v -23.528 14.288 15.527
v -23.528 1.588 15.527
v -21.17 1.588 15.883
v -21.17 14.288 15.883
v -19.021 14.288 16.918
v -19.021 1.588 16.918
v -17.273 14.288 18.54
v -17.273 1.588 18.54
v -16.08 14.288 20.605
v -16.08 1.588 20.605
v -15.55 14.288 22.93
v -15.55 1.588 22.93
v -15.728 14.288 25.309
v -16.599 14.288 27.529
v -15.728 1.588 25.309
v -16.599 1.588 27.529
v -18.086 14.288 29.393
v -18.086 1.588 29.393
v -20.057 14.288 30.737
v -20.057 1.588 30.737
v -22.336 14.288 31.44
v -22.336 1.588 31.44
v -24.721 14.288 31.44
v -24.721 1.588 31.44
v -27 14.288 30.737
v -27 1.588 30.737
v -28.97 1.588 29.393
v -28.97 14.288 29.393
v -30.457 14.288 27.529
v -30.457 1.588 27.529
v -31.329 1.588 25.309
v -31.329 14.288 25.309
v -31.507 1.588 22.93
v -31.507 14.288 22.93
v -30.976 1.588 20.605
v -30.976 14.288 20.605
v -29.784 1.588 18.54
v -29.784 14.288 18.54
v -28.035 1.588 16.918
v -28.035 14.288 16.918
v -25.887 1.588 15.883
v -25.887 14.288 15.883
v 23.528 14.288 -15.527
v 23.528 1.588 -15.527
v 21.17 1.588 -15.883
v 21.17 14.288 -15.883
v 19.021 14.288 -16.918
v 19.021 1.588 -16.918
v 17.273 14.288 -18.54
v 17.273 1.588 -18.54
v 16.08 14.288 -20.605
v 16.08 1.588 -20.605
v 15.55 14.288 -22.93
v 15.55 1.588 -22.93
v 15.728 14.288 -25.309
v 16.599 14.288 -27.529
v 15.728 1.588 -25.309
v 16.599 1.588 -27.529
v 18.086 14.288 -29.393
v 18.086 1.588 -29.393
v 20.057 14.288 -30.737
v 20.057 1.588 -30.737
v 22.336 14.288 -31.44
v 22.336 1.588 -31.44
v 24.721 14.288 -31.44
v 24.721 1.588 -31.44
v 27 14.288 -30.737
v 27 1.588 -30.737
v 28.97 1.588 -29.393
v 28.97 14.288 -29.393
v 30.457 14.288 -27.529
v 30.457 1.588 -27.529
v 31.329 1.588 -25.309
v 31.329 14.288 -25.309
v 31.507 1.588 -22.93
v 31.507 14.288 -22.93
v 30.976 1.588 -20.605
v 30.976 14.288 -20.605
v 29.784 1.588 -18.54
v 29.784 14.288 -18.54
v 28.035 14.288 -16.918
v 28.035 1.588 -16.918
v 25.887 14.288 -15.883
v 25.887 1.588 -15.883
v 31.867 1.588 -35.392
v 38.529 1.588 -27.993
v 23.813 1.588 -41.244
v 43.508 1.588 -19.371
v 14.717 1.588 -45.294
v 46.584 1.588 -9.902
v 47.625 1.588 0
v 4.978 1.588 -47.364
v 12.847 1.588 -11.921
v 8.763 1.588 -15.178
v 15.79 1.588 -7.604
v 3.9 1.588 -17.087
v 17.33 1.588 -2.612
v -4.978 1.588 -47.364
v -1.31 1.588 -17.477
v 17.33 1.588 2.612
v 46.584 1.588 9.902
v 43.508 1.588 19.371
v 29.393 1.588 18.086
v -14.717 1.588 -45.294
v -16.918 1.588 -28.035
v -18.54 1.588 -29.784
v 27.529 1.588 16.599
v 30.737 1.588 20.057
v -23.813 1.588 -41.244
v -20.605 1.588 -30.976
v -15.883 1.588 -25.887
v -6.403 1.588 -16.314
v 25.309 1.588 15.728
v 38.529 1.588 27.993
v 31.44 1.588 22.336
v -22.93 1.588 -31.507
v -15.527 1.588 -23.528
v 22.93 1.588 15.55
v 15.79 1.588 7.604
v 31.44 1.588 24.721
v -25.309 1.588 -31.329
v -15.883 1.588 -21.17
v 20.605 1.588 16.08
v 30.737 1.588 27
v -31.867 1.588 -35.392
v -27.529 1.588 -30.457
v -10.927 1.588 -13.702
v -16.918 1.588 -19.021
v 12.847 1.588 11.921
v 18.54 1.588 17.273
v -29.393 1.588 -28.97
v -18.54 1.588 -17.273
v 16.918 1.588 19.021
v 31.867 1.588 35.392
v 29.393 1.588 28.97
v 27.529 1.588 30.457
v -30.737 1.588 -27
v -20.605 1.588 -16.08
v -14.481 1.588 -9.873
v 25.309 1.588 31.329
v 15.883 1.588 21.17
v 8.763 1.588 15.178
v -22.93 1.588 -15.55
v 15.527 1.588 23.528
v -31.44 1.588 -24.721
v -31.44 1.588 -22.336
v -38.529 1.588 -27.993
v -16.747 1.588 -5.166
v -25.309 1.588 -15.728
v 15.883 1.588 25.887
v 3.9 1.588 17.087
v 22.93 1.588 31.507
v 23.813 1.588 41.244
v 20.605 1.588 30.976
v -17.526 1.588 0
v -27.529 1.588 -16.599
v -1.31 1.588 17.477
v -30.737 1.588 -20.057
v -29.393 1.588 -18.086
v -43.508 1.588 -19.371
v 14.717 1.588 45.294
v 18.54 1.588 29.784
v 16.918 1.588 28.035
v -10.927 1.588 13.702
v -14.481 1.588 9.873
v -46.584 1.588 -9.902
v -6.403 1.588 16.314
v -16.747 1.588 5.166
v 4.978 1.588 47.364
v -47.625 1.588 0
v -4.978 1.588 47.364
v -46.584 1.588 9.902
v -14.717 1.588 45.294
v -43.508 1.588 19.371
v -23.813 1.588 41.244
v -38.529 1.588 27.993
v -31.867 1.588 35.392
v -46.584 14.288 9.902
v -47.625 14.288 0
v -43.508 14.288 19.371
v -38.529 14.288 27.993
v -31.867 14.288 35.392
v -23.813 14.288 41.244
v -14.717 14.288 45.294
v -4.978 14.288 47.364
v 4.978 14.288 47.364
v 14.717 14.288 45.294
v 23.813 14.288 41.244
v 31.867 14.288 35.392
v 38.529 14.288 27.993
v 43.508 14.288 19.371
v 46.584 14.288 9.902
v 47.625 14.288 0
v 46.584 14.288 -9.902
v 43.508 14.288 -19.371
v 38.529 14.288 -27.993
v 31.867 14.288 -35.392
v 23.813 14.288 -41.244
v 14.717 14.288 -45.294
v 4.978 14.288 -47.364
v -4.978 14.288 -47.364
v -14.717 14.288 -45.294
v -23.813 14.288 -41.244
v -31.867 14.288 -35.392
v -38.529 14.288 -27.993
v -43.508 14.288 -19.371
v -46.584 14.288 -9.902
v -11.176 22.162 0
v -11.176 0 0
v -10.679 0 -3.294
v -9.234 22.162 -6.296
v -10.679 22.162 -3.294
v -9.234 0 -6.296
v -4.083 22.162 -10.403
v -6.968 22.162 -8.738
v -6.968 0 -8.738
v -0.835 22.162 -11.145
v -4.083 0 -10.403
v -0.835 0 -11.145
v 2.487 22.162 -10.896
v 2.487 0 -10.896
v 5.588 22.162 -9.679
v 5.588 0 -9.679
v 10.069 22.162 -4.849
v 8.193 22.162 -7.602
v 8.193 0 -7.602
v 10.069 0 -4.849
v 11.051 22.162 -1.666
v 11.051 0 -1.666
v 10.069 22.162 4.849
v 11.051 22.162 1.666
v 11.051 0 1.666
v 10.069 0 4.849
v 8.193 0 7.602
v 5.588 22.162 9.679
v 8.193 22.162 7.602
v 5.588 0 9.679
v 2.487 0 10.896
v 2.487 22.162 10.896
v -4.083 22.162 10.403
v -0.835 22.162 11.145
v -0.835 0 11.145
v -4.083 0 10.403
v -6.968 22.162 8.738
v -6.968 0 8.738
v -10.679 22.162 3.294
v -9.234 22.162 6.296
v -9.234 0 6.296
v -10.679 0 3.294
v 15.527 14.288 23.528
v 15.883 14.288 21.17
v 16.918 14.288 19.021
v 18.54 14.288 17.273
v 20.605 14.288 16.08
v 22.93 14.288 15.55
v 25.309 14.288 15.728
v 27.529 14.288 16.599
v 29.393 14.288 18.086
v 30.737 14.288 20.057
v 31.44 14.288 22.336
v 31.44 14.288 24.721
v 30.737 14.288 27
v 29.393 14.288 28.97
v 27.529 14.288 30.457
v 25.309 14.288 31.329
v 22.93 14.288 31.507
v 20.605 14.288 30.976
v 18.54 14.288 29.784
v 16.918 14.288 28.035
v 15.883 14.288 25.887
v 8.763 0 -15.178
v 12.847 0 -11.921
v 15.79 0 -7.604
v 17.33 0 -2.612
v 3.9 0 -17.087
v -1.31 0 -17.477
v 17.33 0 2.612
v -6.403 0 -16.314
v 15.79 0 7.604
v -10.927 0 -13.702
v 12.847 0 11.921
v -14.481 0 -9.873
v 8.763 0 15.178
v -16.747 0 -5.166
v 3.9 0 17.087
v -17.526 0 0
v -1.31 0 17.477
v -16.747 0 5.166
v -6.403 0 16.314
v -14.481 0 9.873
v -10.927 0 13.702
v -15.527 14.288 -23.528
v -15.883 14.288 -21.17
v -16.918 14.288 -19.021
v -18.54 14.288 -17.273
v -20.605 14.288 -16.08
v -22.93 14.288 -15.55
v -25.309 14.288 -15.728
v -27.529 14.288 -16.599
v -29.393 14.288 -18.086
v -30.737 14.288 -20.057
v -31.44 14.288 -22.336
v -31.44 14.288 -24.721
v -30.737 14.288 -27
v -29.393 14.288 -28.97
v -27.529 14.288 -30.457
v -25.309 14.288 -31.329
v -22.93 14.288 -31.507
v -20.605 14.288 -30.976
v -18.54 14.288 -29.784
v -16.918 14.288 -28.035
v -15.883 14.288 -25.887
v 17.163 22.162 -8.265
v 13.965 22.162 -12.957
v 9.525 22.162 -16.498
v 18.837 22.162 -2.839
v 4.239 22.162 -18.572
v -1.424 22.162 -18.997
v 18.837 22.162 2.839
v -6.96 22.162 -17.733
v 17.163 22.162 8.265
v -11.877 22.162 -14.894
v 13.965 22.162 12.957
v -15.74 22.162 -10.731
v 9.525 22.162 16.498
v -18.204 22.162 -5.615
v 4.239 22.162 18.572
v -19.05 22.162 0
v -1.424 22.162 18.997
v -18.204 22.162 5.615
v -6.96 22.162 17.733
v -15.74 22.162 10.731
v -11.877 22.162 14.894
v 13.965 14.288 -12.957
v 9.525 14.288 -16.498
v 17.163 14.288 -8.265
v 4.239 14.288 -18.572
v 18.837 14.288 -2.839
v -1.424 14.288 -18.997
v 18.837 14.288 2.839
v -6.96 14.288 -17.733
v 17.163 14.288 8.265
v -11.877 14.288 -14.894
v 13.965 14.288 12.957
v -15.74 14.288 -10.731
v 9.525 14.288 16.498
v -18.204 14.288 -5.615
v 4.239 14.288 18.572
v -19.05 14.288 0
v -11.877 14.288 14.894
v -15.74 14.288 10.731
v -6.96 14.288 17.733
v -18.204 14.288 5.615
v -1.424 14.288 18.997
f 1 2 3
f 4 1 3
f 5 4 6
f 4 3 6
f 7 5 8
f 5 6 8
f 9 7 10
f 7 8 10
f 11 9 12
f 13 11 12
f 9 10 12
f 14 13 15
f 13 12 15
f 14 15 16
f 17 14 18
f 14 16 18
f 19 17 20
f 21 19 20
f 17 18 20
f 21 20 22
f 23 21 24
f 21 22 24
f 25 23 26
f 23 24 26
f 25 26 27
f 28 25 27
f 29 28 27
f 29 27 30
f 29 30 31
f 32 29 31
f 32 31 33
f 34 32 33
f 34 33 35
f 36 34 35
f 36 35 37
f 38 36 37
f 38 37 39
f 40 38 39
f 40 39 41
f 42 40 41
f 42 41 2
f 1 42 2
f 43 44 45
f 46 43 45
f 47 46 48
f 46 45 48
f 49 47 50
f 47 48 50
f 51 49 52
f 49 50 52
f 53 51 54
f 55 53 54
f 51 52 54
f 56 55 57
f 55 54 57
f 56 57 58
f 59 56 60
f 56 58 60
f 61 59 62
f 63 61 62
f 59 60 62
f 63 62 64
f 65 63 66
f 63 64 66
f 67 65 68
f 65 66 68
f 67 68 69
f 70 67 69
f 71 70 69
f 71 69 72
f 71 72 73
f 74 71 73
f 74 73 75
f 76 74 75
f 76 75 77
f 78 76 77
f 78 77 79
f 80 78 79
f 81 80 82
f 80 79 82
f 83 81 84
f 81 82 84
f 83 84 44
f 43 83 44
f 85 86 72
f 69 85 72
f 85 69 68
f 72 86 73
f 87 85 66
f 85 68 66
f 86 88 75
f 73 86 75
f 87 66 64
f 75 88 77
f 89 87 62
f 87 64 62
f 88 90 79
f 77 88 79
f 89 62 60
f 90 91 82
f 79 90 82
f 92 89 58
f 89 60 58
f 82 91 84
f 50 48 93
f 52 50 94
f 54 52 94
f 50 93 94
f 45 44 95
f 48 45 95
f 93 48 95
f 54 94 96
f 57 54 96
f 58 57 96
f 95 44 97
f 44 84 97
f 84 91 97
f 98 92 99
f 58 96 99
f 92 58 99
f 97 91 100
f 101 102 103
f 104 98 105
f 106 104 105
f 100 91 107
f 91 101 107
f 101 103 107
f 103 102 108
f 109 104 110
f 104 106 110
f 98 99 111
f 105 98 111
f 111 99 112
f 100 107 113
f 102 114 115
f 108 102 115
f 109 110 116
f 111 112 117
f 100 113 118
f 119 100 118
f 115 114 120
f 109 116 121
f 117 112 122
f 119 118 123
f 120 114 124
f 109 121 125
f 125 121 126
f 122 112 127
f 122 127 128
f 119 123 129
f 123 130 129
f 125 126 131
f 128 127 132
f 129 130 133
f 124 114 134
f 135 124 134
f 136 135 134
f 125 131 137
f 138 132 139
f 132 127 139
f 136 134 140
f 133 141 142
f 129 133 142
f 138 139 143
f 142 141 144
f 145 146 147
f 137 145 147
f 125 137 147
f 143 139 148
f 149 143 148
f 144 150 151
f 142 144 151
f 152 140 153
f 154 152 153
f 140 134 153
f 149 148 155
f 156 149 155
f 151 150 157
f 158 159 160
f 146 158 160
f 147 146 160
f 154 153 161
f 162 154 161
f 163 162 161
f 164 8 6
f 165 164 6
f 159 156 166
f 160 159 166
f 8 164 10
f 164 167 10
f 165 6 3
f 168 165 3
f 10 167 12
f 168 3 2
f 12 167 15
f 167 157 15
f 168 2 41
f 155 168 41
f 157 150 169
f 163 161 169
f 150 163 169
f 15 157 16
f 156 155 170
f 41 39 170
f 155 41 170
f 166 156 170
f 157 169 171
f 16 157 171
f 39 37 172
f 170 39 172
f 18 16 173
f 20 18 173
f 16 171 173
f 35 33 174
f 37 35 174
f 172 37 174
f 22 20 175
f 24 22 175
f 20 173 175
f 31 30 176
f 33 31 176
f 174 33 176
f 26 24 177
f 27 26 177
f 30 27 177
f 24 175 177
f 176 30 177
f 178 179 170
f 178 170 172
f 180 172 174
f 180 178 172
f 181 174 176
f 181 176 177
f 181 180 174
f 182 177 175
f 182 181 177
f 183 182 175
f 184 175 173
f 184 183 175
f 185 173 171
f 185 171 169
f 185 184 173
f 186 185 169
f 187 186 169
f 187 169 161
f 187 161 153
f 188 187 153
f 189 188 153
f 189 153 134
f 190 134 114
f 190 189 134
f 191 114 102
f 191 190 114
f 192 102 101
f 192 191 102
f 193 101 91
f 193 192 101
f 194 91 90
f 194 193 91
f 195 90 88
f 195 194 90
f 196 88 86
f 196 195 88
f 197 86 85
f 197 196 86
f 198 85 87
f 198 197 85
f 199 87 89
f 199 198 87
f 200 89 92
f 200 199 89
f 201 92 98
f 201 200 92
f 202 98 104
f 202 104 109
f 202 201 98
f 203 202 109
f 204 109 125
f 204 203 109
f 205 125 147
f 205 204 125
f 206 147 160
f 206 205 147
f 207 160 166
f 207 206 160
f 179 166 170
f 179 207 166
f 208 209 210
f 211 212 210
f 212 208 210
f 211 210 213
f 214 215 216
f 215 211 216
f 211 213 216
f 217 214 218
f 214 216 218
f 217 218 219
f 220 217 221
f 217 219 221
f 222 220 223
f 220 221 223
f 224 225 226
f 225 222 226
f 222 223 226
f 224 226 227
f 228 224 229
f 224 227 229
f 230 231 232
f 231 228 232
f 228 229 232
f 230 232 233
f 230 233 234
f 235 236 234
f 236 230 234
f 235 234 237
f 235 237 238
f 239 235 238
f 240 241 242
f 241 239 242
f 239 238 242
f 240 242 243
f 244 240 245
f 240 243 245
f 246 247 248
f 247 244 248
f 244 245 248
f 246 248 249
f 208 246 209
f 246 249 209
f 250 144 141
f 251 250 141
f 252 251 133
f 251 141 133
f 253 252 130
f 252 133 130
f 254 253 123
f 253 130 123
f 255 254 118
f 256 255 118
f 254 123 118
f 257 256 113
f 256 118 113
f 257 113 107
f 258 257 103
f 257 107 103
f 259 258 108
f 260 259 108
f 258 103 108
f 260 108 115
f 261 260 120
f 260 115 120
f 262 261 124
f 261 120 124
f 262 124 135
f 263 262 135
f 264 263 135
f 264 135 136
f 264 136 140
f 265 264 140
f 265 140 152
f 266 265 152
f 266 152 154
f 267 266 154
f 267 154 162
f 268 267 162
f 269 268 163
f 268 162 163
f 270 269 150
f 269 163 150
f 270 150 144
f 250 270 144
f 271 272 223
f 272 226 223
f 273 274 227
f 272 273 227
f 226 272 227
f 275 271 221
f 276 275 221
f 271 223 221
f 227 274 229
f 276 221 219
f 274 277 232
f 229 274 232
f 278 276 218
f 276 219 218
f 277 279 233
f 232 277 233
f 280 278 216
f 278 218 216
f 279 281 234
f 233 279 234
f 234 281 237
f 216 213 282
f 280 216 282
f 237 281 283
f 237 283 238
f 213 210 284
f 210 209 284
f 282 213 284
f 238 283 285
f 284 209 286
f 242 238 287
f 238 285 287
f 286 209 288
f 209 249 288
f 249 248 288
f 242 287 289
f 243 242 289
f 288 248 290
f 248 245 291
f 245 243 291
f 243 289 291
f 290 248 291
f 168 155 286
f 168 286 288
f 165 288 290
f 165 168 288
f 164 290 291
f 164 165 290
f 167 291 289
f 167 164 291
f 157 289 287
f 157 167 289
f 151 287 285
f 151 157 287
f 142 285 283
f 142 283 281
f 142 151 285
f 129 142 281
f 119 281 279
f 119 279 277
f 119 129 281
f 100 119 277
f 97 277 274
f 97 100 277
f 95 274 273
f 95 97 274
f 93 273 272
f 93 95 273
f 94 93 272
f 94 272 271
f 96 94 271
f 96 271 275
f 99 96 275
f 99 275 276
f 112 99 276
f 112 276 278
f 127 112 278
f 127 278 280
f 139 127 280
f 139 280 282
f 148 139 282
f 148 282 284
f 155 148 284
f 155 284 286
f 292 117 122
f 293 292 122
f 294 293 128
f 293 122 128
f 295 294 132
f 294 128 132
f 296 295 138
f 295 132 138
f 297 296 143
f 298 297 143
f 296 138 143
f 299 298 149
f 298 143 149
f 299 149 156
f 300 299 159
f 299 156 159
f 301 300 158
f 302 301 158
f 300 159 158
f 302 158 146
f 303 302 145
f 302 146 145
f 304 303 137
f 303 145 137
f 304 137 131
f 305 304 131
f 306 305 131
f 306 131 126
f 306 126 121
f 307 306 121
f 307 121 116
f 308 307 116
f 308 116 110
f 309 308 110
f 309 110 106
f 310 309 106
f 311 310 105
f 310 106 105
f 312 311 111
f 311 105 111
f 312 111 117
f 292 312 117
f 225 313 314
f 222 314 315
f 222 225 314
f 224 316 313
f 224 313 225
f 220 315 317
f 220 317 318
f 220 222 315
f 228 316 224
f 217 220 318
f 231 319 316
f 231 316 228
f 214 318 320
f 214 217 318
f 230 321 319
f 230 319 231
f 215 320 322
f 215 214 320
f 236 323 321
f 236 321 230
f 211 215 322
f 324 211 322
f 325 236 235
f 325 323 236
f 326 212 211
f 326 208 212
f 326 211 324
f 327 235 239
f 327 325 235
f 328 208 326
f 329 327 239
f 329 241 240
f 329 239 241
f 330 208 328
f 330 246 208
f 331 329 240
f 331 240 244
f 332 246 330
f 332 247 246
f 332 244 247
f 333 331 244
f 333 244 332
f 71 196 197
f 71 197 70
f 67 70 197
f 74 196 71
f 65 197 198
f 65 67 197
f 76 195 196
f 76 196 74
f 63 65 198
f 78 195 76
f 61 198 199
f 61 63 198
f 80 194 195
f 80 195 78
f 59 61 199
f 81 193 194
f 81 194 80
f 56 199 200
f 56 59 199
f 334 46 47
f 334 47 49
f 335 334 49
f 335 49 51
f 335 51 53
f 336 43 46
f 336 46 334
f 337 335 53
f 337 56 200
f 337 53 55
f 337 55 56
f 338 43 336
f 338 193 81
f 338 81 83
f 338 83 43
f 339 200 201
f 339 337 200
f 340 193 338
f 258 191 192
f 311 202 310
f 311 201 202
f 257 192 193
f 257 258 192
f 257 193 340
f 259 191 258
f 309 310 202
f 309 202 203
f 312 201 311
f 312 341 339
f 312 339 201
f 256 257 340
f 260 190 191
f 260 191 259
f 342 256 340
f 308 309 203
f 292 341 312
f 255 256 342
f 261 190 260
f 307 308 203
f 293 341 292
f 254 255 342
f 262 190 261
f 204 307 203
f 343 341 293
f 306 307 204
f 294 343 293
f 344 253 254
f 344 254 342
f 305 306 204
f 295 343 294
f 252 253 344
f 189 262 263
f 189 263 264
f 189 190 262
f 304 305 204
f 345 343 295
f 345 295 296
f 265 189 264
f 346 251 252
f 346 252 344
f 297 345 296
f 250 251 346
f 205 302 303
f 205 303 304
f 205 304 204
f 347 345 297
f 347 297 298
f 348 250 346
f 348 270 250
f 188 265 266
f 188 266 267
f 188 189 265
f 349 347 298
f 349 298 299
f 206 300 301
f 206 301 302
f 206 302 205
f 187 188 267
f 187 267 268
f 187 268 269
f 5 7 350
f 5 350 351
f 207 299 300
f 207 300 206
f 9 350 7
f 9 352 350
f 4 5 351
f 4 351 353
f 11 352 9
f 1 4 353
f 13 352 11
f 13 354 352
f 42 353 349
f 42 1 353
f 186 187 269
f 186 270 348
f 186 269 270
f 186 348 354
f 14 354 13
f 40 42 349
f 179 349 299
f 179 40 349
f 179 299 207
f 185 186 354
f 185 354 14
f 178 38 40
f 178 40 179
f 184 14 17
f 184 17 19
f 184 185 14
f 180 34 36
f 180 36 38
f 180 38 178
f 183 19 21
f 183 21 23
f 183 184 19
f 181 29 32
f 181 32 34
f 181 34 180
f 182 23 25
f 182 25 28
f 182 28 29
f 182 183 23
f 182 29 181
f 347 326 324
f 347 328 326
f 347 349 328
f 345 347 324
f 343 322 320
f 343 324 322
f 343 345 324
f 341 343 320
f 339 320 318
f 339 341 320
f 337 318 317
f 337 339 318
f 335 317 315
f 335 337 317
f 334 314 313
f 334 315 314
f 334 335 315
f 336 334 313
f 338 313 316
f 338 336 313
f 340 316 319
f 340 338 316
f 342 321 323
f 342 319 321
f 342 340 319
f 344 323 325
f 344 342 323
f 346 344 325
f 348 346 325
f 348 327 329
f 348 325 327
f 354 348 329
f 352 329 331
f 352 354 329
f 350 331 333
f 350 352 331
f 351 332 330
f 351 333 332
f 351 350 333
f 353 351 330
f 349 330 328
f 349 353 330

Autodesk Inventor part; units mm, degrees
ref_plane "YZ Plane" through (0, 0, 0) normal (1, 0, 0) x (0, 1, 0)
ref_plane "XZ Plane" through (0, 0, 0) normal (0, 1, 0) x (-1, 0, 0)
ref_plane "XY Plane" through (0, 0, 0) normal (0, 0, 1) x (1, 0, 0)
sketch "Sketch1" plane through (0, 0, 0) normal (0, 0, 1) x (1, 0, 0)
  line L0 (0, 0) -> (0, 22.1615) construction
  line L1 (-11.176, 22.1615) -> (-11.176, 0)
  line L2 (-11.176, 0) -> (-17.526, 0)
  line L3 (-17.526, 0) -> (-17.526, 1.5875)
  line L4 (-17.526, 1.5875) -> (-47.625, 1.5875)
  line L5 (-47.625, 1.5875) -> (-47.625, 14.2875)
  line L6 (-47.625, 14.2875) -> (-19.05, 14.2875)
  line L7 (-33.274, 14.2875) -> (-33.274, 1.5875) construction
  line L8 (-11.176, 22.1615) -> (-19.05, 22.1615)
  line L9 (-19.05, 22.1615) -> (-19.05, 14.2875)
  dimension "SB" = 22.352
  dimension "d1" = 1.5875
  dimension "SL" = 20.574
  dimension "Thickness" = 12.7
  dimension "R" = 35.052
  dimension "OD" = 95.25
  dimension "BC" = 66.548
  dimension "HB" = 38.1
revolve "Revolution1" add sketch "Sketch1" angle 360 about axis through (0, 0, 0) along (0, 1, 0)
sketch "Sketch2" plane through (0, 14.2875, 0) normal (0, 1, 0) x (1, 0, 0)
  line L0 (0, 0) -> (0, 47.625) construction
  circle A0 centre (0, 0) radius 47.625 projected
  line L1 (0, 0) -> (23.5283, 23.5283) construction
  dimension "d11" = 45
  dimension "d12" = 33.274
hole "Hole1" at (23.5283, 14.2875, -23.5283) direction (0, -1, 0) diameter 16.002 depth 12.7
pattern_circular "Circular Pattern1" count 4 over 360 about axis through (0, -10, 0) along (0, 1, 0) of "Hole1"
equation "\"d12\" = 0.5 * BC"
properties part number "ANSI-B300-0.5S"
